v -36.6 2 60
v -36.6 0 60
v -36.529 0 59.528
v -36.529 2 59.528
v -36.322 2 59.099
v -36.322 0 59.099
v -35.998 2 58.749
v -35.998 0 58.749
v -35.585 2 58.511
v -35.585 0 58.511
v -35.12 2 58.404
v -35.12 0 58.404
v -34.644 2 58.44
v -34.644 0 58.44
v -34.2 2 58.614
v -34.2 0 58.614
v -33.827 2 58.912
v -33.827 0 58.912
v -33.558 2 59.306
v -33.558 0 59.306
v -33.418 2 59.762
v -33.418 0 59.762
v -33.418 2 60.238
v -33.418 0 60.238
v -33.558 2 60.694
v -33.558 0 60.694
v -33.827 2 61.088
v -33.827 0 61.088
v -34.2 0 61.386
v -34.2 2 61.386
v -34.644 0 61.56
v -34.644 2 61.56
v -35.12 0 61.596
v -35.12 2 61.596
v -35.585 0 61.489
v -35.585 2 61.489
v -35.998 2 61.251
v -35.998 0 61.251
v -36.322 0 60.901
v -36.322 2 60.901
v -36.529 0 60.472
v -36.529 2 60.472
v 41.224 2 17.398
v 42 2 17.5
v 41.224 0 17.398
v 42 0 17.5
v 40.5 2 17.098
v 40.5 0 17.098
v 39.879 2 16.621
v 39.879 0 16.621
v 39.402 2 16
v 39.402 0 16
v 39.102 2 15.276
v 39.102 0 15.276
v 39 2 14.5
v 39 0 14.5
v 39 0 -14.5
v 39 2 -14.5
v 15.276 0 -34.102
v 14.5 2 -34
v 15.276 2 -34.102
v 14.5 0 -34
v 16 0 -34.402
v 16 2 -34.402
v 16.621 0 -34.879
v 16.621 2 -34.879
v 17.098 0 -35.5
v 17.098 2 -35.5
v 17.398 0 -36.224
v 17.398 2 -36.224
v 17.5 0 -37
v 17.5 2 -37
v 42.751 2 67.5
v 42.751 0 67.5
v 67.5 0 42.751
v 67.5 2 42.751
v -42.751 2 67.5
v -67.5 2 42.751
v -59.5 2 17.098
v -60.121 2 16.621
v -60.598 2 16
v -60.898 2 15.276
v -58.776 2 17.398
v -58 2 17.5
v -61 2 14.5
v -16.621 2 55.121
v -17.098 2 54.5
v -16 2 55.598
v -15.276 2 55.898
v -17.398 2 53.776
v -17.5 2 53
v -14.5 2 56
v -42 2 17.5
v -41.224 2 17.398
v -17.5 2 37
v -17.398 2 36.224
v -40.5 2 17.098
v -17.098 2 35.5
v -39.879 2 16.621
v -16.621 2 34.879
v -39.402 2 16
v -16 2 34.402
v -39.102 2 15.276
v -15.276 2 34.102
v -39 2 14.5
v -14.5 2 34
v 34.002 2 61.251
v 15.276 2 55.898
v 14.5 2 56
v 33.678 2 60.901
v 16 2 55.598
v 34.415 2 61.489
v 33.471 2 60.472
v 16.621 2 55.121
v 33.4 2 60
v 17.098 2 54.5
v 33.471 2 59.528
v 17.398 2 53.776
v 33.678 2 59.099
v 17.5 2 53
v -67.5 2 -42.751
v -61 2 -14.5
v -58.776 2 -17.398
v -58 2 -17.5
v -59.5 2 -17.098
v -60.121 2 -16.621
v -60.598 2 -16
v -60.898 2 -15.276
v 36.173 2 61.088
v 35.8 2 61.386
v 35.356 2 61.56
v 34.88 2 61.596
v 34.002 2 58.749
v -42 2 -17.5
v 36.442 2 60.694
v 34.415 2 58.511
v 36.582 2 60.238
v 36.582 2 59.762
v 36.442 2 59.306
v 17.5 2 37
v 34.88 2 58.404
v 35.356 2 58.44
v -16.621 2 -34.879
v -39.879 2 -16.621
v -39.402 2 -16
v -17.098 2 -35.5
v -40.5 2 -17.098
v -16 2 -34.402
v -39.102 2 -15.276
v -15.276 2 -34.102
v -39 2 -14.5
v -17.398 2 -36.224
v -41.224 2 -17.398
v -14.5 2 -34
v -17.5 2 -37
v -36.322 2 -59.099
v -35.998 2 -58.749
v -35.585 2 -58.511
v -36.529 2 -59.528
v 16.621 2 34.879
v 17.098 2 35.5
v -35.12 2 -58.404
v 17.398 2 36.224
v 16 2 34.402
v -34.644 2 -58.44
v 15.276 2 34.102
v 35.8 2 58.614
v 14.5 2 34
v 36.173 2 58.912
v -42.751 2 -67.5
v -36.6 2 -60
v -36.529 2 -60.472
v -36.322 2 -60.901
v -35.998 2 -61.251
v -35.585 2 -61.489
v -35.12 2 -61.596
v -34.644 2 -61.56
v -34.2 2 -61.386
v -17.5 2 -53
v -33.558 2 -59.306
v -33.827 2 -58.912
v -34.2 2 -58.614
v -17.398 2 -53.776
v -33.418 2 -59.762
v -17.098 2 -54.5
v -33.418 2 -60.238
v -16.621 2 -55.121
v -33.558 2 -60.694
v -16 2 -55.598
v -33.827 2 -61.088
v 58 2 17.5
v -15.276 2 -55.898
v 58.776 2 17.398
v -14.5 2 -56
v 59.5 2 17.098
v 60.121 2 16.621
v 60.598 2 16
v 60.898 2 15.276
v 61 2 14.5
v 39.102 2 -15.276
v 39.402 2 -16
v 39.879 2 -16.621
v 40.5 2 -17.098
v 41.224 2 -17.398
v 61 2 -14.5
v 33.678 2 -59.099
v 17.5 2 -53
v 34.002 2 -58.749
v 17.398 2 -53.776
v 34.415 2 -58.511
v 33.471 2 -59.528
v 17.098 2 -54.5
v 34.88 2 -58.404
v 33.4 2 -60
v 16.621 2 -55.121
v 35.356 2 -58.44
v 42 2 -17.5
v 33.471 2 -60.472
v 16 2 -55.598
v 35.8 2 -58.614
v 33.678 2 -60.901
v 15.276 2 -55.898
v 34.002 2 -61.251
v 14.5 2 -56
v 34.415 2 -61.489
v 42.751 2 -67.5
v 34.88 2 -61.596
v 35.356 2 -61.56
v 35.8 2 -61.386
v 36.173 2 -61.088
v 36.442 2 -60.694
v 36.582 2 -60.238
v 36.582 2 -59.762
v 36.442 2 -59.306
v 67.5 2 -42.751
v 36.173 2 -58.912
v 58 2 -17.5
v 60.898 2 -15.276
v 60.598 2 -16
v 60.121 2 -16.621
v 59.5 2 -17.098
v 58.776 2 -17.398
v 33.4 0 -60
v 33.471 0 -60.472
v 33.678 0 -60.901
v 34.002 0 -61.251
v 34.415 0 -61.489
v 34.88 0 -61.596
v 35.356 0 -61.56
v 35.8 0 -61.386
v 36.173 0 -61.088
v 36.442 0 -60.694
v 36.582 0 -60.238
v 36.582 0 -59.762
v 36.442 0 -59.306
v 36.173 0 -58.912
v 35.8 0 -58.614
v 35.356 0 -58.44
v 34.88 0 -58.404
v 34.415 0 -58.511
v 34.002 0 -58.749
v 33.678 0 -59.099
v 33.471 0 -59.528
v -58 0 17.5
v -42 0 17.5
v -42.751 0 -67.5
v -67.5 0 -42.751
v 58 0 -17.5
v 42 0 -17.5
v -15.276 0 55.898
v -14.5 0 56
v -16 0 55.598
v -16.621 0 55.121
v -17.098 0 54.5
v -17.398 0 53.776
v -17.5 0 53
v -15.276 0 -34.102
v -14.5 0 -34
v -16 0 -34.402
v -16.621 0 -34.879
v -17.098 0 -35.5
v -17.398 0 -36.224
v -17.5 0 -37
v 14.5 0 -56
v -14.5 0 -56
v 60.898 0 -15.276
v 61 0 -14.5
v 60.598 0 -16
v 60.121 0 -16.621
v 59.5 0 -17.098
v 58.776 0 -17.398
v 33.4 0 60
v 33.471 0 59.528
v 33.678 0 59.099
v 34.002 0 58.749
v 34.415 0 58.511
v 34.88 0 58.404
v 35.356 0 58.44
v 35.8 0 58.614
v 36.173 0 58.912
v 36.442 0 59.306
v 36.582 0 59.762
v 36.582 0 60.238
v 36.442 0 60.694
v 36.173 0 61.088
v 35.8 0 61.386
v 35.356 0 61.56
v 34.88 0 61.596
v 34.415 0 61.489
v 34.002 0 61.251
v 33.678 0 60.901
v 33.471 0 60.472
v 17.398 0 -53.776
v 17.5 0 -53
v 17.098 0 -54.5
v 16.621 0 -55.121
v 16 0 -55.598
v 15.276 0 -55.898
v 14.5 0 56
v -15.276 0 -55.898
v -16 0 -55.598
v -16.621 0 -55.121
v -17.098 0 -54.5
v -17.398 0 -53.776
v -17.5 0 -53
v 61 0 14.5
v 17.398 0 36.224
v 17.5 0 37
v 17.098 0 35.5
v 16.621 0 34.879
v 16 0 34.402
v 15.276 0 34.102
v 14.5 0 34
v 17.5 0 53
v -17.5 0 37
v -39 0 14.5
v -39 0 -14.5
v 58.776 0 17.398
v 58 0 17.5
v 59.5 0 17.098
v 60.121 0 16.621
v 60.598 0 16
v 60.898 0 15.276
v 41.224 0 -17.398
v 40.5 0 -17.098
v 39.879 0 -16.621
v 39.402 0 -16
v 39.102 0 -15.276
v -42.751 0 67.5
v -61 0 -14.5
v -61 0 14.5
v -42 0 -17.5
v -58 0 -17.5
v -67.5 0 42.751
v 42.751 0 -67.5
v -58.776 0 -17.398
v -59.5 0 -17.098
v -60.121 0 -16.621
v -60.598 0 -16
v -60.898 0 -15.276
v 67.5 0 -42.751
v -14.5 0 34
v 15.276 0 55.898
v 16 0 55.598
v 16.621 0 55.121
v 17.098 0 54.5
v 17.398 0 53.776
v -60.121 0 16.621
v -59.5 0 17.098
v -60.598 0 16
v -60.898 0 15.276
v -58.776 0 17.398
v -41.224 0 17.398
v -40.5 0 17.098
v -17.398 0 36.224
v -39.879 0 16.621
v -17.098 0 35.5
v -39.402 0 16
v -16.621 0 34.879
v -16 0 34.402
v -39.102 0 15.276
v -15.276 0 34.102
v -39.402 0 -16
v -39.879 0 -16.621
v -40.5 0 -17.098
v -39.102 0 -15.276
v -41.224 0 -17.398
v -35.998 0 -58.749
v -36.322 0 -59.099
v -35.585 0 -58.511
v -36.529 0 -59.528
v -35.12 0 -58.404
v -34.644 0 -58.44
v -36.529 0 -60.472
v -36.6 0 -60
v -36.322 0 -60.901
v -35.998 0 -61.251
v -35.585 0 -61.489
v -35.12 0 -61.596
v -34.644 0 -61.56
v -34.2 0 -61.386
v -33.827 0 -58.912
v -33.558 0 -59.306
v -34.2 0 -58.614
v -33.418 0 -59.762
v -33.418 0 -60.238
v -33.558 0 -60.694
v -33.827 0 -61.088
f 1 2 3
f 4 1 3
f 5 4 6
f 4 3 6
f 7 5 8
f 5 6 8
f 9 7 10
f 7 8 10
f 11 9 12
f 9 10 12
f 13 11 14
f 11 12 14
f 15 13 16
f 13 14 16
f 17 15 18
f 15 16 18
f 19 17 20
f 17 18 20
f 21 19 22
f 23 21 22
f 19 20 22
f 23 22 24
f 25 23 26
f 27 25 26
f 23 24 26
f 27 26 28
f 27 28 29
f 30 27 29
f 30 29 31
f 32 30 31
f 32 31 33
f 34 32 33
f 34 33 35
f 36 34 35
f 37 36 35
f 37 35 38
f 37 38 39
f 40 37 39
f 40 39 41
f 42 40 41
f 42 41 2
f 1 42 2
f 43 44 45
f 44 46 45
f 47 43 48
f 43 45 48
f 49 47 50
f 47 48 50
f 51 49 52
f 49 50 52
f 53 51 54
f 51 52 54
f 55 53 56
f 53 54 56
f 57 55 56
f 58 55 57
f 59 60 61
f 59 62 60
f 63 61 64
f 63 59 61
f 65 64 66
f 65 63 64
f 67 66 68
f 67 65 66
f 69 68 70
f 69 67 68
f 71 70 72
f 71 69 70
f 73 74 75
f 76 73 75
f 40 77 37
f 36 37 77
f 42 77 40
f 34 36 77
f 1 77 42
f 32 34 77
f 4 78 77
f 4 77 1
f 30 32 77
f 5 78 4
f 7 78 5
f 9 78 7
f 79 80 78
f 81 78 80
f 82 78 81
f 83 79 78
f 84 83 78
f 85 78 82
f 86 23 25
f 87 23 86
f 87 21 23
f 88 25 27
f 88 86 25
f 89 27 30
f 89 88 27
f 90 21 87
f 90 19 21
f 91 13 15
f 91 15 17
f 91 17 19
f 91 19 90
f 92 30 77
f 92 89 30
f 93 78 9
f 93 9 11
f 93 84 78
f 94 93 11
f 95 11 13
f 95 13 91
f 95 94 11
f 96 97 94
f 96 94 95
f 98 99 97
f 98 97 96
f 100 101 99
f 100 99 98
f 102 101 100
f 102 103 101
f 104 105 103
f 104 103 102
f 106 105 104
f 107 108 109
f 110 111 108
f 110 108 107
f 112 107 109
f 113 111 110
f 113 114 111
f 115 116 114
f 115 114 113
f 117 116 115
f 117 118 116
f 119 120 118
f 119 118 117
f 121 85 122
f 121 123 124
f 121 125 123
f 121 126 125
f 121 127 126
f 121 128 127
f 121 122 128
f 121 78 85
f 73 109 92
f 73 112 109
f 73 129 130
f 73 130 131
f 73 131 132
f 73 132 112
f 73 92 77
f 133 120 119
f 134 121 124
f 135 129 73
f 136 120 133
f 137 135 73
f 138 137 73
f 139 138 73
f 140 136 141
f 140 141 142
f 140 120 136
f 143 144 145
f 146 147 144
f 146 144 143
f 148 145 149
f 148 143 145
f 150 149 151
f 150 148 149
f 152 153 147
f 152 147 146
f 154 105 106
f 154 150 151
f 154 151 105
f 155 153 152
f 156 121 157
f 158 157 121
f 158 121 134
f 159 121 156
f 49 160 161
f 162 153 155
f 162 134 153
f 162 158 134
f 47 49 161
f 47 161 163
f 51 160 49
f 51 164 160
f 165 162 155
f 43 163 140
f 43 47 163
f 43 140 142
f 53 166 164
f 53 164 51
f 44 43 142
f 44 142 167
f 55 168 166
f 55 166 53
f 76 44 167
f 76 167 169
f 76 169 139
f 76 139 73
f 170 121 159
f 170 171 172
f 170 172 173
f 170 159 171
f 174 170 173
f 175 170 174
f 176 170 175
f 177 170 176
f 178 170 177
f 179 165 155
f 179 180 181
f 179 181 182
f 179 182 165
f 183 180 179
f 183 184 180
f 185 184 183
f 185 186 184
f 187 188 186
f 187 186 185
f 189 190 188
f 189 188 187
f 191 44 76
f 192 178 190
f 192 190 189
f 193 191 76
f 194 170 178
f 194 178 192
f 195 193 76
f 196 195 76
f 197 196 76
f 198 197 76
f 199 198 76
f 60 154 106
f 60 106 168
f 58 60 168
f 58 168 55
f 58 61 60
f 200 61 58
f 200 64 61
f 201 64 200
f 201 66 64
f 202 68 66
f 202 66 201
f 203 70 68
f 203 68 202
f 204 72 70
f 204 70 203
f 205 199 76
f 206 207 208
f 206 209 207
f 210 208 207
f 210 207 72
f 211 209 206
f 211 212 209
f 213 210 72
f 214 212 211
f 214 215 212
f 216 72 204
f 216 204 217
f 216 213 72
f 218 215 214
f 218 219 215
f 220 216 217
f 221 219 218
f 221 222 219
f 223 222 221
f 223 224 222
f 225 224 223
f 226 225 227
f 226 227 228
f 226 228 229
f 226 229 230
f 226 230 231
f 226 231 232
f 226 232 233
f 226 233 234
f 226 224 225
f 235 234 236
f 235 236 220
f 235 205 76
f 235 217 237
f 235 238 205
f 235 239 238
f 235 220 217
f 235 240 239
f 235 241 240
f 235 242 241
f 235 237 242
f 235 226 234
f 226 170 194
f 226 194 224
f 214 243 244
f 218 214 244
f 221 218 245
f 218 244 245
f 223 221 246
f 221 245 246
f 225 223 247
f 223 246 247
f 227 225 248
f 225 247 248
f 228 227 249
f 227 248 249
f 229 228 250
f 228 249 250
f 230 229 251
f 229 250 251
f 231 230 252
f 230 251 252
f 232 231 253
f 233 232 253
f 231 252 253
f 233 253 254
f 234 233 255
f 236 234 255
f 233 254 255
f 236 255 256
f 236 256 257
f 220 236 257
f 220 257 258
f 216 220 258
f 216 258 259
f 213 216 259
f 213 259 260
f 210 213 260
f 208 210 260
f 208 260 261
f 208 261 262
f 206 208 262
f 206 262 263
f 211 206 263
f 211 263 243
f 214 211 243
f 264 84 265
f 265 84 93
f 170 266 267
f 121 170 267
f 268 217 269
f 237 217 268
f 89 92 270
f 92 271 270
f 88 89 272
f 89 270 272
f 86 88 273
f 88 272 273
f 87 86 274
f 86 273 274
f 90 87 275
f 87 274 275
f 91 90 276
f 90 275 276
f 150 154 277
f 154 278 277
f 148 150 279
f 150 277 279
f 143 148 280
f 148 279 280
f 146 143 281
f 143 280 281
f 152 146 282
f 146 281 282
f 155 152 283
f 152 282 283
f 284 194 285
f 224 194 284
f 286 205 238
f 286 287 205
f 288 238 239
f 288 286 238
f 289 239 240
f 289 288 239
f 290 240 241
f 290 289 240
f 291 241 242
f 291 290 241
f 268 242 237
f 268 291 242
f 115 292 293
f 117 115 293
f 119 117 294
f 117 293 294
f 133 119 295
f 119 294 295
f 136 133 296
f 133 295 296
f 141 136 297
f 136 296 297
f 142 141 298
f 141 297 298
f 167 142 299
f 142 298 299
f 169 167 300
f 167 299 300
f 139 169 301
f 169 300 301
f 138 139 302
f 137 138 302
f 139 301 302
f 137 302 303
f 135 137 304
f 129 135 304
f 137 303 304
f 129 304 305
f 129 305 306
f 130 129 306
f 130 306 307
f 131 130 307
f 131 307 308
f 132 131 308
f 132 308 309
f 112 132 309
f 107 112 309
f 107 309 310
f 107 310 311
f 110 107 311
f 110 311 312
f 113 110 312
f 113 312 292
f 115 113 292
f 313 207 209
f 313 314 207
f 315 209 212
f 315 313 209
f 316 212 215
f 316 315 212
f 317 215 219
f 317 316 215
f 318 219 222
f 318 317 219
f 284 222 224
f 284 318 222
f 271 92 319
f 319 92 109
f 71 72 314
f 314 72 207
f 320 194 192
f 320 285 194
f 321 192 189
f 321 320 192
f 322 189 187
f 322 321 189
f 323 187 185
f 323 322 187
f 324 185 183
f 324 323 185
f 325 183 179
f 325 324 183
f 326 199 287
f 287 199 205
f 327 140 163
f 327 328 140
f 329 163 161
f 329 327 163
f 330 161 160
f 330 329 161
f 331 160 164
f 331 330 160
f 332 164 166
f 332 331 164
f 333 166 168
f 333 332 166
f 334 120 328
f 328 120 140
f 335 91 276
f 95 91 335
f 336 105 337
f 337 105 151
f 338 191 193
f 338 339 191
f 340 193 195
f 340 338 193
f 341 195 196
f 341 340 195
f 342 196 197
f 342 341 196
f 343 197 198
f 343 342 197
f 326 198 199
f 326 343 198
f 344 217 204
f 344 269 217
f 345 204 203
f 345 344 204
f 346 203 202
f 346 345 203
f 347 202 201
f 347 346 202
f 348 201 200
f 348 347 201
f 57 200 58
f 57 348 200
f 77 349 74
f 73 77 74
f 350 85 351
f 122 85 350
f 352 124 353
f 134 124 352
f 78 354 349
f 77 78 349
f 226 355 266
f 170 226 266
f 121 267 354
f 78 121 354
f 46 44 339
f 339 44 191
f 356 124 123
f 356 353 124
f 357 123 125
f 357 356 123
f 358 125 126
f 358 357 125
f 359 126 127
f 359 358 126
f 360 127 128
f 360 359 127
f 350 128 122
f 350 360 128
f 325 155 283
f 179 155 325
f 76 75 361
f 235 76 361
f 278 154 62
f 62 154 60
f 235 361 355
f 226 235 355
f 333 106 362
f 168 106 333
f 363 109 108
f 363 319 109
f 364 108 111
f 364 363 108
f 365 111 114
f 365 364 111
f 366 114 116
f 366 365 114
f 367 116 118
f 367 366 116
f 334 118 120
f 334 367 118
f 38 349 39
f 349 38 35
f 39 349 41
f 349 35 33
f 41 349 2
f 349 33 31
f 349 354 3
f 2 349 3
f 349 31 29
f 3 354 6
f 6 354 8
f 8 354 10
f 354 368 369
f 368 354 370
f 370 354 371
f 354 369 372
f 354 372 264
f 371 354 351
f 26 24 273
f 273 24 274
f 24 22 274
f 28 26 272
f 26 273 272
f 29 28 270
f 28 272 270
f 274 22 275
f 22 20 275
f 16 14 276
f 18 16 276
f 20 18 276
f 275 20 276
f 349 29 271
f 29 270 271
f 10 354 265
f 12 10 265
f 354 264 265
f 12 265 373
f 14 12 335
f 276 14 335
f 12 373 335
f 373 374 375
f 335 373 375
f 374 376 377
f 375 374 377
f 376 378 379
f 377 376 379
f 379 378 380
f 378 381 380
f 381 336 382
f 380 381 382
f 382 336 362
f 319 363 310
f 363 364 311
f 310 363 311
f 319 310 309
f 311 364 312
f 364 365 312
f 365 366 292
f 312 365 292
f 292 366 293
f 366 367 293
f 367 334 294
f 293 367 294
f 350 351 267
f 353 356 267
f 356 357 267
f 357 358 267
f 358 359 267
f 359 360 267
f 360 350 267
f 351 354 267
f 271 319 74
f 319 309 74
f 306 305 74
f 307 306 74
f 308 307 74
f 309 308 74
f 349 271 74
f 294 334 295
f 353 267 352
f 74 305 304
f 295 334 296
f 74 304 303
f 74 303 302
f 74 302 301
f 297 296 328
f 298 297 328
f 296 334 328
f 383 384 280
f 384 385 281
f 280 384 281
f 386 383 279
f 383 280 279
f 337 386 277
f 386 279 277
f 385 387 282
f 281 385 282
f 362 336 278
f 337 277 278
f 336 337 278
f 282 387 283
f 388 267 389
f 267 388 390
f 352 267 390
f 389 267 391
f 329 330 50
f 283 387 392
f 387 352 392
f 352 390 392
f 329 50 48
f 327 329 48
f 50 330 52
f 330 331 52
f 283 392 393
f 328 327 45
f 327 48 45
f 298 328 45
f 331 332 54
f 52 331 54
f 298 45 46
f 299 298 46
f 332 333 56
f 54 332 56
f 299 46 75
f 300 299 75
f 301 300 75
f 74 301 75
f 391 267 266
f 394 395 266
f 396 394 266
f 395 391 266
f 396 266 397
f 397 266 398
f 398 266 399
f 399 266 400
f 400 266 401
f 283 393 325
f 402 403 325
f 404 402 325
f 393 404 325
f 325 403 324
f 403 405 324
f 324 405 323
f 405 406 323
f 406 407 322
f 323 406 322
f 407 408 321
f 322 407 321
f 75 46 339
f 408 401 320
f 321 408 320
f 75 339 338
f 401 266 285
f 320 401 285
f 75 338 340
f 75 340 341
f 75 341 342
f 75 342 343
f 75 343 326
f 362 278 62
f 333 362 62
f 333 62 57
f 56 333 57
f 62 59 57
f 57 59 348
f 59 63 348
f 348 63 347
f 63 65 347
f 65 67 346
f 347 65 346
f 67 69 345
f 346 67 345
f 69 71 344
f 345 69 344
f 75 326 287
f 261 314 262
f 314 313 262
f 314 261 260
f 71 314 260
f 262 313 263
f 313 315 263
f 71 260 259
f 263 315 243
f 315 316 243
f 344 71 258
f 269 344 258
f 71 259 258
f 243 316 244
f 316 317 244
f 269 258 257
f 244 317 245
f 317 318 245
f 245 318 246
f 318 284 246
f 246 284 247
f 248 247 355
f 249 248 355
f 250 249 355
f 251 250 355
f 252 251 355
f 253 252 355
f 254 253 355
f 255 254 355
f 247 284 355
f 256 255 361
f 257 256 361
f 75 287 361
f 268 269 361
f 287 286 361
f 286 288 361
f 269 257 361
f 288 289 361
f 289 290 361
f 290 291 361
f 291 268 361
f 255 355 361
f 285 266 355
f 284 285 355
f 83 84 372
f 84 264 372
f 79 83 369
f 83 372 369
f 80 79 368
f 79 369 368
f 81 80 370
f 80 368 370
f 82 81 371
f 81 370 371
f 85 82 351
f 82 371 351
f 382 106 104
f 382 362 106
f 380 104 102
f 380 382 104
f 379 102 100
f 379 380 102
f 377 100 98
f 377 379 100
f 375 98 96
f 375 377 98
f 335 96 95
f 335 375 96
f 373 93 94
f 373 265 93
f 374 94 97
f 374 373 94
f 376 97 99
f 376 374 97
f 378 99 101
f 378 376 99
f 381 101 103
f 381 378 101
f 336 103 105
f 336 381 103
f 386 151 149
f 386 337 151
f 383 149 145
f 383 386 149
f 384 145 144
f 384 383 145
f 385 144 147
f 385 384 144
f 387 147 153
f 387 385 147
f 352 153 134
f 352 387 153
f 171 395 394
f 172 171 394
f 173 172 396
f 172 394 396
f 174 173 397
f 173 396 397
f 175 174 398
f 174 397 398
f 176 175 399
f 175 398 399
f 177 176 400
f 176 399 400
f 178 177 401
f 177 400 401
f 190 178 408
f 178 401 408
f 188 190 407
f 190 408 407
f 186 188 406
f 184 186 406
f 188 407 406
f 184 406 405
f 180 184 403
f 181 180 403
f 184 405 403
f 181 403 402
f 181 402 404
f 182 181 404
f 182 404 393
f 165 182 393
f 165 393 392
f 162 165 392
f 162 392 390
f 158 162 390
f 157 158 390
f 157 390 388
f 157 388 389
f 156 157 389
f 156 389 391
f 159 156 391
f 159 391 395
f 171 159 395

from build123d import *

# Parameters (mm, degrees)
BOSS_EXTRUDE1_DEPTH  = 2
M3_CLEARANCE_HOLE1_D = 3.2
SKETCH4_W            = 35
SKETCH4_H            = 22
SKETCH4_W_2          = 22
SKETCH4_H_2          = 35
CUT_EXTRUDE1_DEPTH   = 96.480364474
FILLET1_R            = 3


with BuildPart() as part:
    # Sketch1 → Boss-Extrude1 (new body)
    with BuildSketch(Plane(origin=(0, 0, 0), x_dir=(1, 0, 0), z_dir=(0, 1, 0))):
        Polygon((-42.751262658, 67.5), (-67.5, 42.751262658), (-67.5, -42.751262658), (-42.751262658, -67.5), (42.751262658, -67.5), (67.5, -42.751262658), (67.5, 42.751262658), (42.751262658, 67.5), align=None)
    extrude(amount=BOSS_EXTRUDE1_DEPTH)

    # M3 Clearance Hole1 (through all)
    with Locations(Plane(origin=(0, 2, 0), x_dir=(1, 0, 0), z_dir=(0, 1, 0))):
        with Locations((-35, 60), (35, -60), (35, 60), (-35, -60)):
            Hole(M3_CLEARANCE_HOLE1_D / 2)

    # Sketch4 → Cut-Extrude1 (cut, through all)
    with BuildSketch(Plane(origin=(0, 2, 0), x_dir=(1, 0, 0), z_dir=(0, 1, 0))):
        with Locations((0, 45)):
            Rectangle(SKETCH4_W, SKETCH4_H)
        with Locations((-50, 0)):
            Rectangle(SKETCH4_W_2, SKETCH4_H_2)
        with Locations((50, 0)):
            Rectangle(SKETCH4_W_2, SKETCH4_H_2)
        with Locations((0, -45)):
            Rectangle(SKETCH4_W, SKETCH4_H)
    extrude(amount=-CUT_EXTRUDE1_DEPTH, mode=Mode.SUBTRACT)

    # Fillet1
    fillet1_edges = [part.edges().sort_by_distance(p)[0] for p in [
        (-17.5, 1, -34),
        (-17.5, 1, -56),
        (17.5, 1, -56),
        (17.5, 1, -34),
        (-39, 1, -17.5),
        (-39, 1, 17.5),
        (-61, 1, 17.5),
        (-61, 1, -17.5),
        (61, 1, -17.5),
        (61, 1, 17.5),
        (39, 1, 17.5),
        (39, 1, -17.5),
        (17.5, 1, 34),
        (17.5, 1, 56),
        (-17.5, 1, 56),
        (-17.5, 1, 34),
    ]]
    fillet(fillet1_edges, radius=FILLET1_R)


solid = part.part
